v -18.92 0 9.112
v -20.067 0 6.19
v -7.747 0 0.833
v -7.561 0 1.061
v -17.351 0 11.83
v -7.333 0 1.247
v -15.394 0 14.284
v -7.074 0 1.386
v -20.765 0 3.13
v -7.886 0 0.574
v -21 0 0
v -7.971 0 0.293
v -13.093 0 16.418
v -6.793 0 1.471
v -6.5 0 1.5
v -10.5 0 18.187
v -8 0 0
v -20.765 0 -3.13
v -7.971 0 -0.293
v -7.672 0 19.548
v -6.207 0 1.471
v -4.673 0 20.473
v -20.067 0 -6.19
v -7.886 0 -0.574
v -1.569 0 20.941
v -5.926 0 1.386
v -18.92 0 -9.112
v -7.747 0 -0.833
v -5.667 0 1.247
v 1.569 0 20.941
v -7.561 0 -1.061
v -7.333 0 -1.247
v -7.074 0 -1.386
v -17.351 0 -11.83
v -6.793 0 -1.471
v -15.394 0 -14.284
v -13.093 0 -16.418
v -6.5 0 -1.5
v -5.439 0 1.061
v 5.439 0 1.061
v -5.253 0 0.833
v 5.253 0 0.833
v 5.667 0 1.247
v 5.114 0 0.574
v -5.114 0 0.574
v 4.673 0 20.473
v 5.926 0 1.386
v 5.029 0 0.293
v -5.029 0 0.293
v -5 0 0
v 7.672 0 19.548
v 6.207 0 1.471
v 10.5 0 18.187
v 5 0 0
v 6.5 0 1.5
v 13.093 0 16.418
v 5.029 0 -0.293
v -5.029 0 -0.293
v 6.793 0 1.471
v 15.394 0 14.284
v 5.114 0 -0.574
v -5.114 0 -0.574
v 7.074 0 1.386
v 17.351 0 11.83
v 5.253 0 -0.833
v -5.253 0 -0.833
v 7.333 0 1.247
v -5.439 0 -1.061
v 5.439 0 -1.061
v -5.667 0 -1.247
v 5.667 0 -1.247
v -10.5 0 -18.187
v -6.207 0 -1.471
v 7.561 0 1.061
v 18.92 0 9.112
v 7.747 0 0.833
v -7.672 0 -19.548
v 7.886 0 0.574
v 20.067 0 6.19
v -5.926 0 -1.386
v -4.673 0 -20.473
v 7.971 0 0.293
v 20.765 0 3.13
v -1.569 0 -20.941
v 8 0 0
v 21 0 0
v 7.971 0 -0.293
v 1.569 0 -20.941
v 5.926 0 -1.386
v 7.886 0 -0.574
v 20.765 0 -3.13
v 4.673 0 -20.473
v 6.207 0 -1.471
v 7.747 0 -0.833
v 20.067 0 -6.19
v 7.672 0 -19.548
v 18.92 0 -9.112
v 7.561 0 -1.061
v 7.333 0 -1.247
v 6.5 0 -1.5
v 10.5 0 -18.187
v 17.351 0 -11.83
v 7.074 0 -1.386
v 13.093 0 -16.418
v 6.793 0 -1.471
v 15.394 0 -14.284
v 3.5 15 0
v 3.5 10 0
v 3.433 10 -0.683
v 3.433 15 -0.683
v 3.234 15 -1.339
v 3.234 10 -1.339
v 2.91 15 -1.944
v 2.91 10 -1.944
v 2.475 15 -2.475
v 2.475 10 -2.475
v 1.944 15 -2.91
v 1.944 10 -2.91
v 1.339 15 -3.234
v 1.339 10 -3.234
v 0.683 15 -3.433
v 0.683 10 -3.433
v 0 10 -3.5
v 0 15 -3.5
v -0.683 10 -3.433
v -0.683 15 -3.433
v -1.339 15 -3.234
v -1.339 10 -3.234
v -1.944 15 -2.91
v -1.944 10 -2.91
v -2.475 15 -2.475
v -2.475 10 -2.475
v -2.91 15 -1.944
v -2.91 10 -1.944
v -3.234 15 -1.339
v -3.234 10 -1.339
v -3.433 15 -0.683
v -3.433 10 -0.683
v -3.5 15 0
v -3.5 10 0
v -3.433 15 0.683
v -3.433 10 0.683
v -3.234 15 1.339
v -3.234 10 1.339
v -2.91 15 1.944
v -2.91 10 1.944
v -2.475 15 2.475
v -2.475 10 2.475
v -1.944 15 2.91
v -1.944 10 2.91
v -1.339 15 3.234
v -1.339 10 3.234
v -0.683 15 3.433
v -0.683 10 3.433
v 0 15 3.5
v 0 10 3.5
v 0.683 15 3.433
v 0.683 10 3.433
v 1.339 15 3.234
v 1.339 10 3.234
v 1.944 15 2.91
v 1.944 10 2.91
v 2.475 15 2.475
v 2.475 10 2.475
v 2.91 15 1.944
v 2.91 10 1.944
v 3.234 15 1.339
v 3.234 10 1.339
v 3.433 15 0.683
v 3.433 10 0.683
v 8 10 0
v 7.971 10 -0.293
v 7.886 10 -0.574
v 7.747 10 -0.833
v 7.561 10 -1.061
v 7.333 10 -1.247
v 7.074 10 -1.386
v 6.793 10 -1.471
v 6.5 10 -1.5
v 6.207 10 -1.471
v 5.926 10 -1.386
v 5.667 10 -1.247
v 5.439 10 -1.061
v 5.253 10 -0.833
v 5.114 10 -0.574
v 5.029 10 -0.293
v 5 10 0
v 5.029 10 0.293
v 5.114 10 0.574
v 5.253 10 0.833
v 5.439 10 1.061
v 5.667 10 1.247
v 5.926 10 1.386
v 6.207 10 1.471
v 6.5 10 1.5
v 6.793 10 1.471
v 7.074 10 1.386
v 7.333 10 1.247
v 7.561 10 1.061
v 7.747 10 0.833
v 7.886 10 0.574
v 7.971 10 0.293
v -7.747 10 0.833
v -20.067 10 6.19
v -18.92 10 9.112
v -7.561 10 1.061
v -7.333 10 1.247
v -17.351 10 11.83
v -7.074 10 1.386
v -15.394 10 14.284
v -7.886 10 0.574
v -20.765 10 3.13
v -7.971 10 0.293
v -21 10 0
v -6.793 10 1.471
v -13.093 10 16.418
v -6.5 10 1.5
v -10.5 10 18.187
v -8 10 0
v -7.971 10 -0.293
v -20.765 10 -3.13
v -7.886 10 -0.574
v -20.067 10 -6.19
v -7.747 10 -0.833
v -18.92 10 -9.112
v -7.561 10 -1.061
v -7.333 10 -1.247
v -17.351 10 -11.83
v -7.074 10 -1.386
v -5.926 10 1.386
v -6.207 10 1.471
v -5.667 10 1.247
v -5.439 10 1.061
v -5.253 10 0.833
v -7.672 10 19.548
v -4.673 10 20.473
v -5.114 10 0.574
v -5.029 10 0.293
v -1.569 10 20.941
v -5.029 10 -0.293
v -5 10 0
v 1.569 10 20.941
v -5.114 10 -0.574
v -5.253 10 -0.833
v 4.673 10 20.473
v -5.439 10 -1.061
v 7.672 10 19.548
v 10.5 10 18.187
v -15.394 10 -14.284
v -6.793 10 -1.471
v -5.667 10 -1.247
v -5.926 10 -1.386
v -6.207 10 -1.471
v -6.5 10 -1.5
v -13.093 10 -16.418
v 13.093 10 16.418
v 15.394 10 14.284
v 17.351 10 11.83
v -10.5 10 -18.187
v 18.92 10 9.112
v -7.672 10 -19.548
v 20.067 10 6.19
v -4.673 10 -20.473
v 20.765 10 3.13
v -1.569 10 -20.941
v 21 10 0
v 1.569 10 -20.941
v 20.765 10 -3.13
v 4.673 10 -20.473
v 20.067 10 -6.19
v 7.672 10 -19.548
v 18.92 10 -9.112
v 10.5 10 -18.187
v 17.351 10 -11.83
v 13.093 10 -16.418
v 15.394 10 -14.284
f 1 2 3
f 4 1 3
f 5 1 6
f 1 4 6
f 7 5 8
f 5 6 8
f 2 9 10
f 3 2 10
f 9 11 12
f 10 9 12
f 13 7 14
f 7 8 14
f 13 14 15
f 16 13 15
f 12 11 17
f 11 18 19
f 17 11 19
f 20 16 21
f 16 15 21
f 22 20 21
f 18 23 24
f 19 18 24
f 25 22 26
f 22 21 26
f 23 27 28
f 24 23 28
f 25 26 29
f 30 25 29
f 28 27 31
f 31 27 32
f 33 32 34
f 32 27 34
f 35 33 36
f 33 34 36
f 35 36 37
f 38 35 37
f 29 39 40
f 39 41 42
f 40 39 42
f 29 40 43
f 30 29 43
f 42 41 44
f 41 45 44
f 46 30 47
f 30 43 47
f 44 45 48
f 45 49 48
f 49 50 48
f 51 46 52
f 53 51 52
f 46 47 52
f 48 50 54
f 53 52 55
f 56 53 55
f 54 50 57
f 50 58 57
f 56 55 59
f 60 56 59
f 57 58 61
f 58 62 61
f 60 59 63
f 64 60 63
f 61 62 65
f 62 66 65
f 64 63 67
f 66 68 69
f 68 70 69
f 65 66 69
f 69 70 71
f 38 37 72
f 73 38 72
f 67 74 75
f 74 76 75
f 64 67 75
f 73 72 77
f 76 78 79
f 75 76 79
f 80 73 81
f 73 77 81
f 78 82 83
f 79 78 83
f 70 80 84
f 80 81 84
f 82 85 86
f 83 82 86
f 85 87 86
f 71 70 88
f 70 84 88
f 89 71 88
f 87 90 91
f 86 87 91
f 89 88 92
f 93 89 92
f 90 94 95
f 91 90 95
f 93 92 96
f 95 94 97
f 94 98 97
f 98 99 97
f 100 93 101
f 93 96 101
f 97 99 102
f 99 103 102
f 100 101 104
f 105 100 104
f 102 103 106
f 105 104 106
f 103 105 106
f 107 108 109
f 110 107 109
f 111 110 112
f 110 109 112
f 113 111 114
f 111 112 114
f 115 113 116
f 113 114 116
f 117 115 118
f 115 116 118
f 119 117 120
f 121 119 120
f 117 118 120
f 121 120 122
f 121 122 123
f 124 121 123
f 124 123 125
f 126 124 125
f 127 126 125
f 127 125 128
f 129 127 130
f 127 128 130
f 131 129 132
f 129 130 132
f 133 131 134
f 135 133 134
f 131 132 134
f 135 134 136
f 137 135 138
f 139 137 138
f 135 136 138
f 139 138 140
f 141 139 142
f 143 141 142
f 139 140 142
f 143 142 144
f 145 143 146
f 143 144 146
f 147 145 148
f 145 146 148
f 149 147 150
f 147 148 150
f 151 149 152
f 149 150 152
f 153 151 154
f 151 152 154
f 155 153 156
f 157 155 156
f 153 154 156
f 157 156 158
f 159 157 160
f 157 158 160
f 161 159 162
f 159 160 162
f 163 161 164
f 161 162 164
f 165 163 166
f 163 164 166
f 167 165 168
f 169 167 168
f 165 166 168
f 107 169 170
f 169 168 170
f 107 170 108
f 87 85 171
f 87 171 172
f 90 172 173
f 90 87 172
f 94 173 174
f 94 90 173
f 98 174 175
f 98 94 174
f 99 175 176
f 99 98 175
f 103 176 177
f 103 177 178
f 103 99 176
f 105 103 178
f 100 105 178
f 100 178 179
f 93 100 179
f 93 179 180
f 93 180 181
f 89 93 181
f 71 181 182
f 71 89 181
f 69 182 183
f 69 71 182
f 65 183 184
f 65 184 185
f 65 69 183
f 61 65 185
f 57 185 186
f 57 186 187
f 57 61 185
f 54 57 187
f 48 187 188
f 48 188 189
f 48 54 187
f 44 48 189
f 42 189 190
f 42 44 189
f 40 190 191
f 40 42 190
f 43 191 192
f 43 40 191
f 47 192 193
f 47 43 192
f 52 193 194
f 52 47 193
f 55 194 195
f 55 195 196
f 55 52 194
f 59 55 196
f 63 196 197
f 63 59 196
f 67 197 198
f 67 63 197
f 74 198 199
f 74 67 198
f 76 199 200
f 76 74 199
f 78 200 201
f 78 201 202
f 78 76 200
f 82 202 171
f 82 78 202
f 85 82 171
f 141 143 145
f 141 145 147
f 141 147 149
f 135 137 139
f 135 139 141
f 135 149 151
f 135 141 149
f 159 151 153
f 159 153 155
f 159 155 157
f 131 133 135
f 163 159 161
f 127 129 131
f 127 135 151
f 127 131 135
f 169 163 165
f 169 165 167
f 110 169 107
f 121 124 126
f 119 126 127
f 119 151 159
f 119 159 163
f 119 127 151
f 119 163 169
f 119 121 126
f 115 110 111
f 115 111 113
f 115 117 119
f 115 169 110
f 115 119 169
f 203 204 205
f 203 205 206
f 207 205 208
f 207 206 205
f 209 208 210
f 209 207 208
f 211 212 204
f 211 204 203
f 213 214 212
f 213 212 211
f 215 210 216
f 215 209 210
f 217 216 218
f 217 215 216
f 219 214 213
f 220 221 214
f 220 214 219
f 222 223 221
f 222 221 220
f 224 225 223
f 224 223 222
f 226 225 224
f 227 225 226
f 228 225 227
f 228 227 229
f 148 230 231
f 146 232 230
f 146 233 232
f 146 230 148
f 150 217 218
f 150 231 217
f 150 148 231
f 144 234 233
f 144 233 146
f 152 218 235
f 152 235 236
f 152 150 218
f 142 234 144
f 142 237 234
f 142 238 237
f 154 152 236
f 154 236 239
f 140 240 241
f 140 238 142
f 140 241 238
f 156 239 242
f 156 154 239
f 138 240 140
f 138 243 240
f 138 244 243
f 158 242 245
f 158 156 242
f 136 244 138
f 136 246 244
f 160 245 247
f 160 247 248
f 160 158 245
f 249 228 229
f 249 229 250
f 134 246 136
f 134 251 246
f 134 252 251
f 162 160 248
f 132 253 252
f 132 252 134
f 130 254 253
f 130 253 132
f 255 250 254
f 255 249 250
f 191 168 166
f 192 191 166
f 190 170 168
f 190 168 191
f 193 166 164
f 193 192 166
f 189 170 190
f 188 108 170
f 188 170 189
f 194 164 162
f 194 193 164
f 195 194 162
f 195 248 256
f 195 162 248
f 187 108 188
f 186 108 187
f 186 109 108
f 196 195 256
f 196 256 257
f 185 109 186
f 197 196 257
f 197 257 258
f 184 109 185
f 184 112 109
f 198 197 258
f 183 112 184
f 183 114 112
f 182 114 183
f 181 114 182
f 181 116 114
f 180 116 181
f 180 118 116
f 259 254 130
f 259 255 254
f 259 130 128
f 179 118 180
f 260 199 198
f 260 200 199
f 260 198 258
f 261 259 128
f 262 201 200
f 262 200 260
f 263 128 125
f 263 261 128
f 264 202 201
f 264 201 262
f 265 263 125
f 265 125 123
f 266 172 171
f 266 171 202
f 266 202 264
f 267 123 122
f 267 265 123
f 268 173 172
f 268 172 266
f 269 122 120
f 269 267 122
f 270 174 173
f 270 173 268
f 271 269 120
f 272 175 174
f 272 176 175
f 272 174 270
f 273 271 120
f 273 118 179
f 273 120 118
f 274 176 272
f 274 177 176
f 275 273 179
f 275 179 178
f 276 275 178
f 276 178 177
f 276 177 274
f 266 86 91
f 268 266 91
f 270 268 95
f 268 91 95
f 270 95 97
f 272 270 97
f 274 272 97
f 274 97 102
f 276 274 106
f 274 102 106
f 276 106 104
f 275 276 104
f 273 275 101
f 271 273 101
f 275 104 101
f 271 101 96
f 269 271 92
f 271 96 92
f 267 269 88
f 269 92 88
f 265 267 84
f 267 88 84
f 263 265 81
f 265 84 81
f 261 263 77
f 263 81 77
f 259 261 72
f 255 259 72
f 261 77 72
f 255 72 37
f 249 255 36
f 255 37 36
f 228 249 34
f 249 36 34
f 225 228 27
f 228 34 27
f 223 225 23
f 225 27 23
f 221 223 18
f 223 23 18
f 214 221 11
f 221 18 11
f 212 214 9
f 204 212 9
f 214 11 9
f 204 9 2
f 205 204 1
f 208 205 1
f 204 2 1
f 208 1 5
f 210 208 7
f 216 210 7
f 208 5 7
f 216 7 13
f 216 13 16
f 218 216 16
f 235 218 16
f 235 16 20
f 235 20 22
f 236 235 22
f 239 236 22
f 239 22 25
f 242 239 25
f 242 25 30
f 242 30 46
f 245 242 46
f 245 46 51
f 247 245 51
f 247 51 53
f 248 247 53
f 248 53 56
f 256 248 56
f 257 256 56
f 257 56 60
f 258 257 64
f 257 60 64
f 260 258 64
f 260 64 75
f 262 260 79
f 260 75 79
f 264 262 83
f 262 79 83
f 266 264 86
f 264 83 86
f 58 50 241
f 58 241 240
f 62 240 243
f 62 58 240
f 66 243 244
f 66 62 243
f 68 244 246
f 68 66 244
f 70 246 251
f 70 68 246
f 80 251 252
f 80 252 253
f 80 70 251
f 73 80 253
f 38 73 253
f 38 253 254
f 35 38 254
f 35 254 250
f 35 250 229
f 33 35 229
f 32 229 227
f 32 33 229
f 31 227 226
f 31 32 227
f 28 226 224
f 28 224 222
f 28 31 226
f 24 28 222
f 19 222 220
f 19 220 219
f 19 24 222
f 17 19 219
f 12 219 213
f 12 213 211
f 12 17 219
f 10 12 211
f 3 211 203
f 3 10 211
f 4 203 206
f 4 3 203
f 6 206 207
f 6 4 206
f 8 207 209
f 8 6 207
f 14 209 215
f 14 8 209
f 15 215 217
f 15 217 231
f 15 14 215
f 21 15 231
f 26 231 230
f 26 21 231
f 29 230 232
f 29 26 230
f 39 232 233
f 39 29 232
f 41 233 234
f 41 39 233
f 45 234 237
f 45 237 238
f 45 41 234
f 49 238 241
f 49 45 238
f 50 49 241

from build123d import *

# Parameters (mm, degrees)
SKETCH_1_R      = 21
SKETCH_1_R_2    = 1.5
EXTRUDE_1_DEPTH = 10
SKETCH_2_R      = 3.5
EXTRUDE_2_DEPTH = 5


with BuildPart() as part:
    # 草图1 → 凸台-拉伸1 (new body)
    with BuildSketch(Plane(origin=(0, 0, 0), x_dir=(1, 0, 0), z_dir=(0, 1, 0))):
        Circle(SKETCH_1_R)
        with Locations((-6.5, 0)):
            Circle(SKETCH_1_R_2, mode=Mode.SUBTRACT)
        with Locations((6.5, 0)):
            Circle(SKETCH_1_R_2, mode=Mode.SUBTRACT)
    extrude(amount=EXTRUDE_1_DEPTH)

    # 草图2 → 凸台-拉伸2 (add)
    with BuildSketch(Plane(origin=(0, 10, 0), x_dir=(1, 0, 0), z_dir=(0, 1, 0))):
        Circle(SKETCH_2_R)
    extrude(amount=EXTRUDE_2_DEPTH)


solid = part.part
